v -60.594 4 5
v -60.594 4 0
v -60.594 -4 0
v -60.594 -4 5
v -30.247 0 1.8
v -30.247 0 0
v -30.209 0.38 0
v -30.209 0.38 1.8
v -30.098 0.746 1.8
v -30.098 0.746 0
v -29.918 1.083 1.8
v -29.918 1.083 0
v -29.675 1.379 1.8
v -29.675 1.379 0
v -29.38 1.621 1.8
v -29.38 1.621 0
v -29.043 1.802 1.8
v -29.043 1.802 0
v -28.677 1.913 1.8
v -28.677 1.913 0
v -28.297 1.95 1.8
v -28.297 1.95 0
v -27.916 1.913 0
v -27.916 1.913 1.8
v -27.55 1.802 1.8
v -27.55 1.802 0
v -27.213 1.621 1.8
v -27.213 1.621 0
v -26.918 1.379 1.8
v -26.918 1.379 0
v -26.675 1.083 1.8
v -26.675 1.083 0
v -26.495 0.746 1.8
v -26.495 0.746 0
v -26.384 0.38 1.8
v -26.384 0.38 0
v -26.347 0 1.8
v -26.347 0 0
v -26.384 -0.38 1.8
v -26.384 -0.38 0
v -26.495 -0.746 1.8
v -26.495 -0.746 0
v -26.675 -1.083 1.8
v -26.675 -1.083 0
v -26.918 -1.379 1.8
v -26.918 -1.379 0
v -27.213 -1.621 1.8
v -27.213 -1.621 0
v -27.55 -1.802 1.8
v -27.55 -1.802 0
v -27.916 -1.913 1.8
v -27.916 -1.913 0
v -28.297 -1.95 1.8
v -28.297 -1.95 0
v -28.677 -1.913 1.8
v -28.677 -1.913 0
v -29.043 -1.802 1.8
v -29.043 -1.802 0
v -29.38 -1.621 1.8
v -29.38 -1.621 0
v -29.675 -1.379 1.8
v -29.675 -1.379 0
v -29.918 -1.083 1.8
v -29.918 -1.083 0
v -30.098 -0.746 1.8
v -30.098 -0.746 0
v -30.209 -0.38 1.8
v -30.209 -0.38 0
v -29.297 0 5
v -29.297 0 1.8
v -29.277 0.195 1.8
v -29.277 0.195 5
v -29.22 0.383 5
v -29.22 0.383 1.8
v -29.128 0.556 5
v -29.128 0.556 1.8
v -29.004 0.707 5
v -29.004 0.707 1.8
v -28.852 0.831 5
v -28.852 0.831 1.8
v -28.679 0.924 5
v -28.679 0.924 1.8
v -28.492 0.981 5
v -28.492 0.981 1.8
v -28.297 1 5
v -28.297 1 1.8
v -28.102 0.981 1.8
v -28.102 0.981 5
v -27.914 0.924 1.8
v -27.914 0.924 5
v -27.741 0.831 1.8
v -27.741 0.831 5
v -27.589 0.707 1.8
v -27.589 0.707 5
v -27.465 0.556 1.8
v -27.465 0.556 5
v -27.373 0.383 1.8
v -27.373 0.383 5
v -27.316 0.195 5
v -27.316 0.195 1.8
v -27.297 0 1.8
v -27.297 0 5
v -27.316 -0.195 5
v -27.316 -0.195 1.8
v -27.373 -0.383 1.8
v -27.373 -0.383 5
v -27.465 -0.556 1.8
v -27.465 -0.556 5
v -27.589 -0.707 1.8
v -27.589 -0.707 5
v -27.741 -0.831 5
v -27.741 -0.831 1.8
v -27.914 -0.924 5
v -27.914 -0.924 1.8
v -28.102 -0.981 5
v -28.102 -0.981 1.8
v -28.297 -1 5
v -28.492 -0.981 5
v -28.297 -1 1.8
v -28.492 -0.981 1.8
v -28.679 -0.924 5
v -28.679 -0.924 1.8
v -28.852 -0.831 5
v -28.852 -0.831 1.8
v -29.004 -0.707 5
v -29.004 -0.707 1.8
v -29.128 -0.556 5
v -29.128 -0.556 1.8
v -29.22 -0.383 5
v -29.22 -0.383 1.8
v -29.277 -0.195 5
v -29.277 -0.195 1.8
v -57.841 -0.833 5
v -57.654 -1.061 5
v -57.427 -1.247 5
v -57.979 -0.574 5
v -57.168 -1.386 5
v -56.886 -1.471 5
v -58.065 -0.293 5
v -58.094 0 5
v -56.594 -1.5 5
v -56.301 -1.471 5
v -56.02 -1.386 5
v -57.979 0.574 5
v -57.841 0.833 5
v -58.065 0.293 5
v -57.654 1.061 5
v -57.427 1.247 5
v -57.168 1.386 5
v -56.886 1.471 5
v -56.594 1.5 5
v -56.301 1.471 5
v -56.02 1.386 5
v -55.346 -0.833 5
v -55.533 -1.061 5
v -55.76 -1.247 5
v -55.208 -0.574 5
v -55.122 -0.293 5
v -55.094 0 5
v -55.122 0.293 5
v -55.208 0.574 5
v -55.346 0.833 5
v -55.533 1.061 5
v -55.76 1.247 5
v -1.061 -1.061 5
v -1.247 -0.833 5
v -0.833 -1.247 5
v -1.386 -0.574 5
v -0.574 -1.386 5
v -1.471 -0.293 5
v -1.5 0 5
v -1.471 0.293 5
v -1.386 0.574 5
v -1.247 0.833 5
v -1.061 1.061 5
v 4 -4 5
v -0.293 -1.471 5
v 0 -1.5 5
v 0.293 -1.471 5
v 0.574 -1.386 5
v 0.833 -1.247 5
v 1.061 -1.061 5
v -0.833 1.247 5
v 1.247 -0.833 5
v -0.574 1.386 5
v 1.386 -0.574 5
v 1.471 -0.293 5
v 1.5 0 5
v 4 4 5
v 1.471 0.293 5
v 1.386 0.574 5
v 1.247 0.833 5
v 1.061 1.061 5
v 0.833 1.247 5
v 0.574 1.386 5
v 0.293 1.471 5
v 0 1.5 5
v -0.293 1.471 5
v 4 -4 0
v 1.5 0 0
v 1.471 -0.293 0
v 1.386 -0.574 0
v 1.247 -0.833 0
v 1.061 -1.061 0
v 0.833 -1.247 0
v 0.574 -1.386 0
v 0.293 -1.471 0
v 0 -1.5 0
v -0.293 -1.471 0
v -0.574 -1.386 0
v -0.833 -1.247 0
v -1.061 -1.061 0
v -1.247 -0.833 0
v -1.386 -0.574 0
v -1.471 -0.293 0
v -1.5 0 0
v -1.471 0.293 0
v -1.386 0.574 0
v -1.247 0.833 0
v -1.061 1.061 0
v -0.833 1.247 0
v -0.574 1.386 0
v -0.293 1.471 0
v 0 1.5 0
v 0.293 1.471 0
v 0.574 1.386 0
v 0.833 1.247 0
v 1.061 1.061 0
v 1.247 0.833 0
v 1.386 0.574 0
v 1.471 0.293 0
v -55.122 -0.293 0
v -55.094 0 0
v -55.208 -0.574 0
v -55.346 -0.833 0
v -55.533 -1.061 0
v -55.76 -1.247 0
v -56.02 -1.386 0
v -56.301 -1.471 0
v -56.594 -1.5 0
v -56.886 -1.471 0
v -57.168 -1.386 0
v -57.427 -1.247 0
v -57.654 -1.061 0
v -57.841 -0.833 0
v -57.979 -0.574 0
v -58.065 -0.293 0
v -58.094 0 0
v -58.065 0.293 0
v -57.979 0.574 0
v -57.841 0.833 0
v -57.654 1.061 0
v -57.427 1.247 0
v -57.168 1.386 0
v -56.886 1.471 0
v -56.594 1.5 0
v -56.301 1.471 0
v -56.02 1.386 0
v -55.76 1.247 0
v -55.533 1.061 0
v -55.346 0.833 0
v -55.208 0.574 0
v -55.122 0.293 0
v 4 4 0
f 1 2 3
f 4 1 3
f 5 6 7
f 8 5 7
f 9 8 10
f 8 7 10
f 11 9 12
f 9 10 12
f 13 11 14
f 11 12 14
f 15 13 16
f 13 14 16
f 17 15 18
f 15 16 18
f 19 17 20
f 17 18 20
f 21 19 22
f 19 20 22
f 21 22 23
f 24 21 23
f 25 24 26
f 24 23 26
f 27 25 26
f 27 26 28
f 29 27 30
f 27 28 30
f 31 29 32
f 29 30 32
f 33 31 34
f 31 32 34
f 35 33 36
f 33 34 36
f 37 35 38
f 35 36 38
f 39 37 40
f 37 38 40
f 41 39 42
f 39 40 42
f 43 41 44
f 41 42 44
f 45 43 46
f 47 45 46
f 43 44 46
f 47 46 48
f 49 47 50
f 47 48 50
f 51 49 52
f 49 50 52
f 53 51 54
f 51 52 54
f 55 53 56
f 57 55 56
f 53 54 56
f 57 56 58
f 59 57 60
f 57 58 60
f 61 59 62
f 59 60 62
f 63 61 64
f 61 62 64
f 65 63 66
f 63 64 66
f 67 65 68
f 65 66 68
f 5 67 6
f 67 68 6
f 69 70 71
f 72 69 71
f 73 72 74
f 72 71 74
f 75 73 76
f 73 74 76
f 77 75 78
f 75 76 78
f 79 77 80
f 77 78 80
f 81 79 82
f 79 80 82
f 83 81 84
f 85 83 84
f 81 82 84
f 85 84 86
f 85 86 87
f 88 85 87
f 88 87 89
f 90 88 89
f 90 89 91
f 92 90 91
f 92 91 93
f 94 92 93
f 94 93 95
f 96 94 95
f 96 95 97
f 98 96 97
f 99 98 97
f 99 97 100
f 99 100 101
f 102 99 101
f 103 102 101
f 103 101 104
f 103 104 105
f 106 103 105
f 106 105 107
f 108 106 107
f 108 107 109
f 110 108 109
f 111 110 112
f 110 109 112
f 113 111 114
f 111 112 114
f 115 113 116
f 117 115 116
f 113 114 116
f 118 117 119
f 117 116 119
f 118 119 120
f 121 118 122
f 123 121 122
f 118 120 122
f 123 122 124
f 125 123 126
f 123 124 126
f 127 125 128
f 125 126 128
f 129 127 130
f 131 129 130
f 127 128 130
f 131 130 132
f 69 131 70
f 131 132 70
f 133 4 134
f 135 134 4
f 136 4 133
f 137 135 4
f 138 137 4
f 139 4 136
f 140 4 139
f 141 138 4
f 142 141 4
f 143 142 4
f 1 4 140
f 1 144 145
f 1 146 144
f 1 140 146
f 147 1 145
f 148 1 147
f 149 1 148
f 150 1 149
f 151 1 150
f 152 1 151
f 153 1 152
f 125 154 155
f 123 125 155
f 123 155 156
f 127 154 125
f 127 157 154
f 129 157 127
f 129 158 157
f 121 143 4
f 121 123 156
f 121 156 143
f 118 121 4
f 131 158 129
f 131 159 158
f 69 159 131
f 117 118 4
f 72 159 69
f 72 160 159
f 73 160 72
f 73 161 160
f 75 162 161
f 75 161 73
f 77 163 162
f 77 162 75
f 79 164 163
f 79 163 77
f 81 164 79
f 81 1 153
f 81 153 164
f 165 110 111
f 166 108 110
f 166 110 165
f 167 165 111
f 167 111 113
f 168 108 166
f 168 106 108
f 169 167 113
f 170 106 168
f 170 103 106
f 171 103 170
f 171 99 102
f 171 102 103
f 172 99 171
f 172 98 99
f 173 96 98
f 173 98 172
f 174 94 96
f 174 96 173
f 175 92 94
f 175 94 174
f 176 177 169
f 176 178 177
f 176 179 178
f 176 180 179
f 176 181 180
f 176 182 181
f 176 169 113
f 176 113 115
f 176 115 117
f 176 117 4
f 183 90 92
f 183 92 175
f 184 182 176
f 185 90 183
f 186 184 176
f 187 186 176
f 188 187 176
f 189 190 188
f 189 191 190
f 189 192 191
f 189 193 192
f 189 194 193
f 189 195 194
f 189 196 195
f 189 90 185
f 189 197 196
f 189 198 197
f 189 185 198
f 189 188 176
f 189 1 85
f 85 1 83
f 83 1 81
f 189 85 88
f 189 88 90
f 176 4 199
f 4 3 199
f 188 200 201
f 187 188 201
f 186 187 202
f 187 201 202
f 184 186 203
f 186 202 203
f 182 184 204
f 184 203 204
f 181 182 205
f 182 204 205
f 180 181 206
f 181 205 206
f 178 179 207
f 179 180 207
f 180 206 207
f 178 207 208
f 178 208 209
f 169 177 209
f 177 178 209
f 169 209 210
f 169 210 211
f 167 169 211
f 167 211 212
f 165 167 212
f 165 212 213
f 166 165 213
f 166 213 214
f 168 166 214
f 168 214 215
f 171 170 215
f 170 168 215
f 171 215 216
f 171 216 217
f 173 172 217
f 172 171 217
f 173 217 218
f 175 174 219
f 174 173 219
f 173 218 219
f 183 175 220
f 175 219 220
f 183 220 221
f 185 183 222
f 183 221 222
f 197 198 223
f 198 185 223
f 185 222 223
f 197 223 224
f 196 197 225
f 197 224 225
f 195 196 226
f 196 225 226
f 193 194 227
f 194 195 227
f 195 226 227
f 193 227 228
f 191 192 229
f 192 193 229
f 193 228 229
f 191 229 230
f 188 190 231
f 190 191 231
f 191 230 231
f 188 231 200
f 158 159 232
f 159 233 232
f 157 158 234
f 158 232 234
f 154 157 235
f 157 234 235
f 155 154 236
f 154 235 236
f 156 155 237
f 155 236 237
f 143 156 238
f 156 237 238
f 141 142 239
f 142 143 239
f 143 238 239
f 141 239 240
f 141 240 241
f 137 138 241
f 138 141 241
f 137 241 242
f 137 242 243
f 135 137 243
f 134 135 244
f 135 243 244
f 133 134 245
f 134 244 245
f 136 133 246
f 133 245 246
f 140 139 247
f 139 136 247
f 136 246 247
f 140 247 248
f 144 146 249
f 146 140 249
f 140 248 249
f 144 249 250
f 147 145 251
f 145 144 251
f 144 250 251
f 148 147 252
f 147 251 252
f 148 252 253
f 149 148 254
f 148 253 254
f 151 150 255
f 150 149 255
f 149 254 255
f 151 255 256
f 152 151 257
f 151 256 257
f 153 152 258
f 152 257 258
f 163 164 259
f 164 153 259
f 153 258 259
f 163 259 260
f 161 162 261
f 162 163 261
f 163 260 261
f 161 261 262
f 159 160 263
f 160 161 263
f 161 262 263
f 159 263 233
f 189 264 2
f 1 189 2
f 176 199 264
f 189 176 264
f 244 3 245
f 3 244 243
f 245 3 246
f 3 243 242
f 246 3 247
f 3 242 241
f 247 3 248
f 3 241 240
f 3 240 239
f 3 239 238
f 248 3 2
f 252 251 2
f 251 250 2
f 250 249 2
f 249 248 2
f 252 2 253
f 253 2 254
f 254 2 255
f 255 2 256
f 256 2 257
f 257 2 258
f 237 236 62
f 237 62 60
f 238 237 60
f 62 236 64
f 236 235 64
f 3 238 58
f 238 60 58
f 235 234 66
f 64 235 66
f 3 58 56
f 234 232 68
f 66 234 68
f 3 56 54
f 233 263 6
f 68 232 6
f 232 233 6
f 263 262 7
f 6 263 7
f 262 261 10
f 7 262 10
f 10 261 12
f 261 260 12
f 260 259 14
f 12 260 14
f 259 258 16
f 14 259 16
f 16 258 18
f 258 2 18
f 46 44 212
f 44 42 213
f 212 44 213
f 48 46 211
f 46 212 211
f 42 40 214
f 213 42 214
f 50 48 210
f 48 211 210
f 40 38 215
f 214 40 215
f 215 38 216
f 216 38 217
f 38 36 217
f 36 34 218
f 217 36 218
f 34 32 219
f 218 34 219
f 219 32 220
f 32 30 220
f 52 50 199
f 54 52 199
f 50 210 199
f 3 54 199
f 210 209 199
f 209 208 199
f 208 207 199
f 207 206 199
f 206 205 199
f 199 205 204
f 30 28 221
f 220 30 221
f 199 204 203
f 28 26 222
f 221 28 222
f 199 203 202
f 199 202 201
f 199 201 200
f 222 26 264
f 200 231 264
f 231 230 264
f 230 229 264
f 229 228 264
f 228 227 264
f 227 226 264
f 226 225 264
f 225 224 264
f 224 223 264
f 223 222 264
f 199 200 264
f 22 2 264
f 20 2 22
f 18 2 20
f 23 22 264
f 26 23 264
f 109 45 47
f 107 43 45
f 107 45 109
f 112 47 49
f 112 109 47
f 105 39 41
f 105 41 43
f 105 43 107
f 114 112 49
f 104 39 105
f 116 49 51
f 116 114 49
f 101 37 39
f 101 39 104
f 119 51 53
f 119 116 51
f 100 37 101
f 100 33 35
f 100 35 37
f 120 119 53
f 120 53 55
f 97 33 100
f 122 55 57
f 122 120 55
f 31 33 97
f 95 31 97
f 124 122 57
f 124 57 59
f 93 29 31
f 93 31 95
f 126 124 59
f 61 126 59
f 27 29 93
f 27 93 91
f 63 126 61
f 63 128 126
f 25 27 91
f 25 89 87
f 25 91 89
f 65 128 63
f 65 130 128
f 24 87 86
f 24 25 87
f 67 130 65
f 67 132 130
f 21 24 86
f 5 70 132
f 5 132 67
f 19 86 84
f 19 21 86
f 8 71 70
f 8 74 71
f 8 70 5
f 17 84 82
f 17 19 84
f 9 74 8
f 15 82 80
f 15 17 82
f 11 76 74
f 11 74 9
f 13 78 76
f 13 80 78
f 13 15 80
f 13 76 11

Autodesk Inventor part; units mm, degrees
ref_plane "YZ Plane" through (0, 0, 0) normal (1, 0, 0) x (0, 1, 0)
ref_plane "XZ Plane" through (0, 0, 0) normal (0, 1, 0) x (-1, 0, 0)
ref_plane "XY Plane" through (0, 0, 0) normal (0, 0, 1) x (1, 0, 0)
sketch "Sketch1" plane through (0, 0, 0) normal (0, 0, 1) x (1, 0, 0)
  circle A0 centre (-56.5936, 0) radius 1.5 projected
  line L0 (-52.5936, 4) -> (-60.5936, 4) projected
  line L1 (-60.5936, 4) -> (-60.5936, -4) projected
  line L2 (-60.5936, -4) -> (-52.5936, -4) projected
  line L3 (-52.5936, -4) -> (-52.5936, 4) projected
  circle A1 centre (0, 0) radius 1.5 projected
  line L4 (-4, 4) -> (-4, -4) projected
  line L5 (-4, -4) -> (4, -4) projected
  line L6 (4, -4) -> (4, 4) projected
  line L7 (4, 4) -> (-4, 4) projected
  line L8 (-60.5936, 4) -> (4, 4)
  line L9 (4, 4) -> (4, -4)
  line L10 (4, -4) -> (-60.5936, -4)
  line L11 (-60.5936, -4) -> (-60.5936, 4)
  point P0 (0, 0)
extrude "Extrusion1" add sketch "Sketch1" along normal blind 5
sketch "Sketch2" plane through (0, 0, 0) normal (0, 0, -1) x (-1, 0, 0)
  point P0 (0, 0)
sketch "Sketch3" plane through (0, 0, 0) normal (0, 0, -1) x (-1, 0, 0)
  line L0 (60.5936, 4) -> (60.5936, -4) projected
  line L1 (-4, 4) -> (60.5936, 4) projected
  line L2 (-4, -4) -> (-4, 4) projected
  line L3 (60.5936, -4) -> (-4, -4) projected
  circle A0 centre (0, 0) radius 1.5 projected
  circle A1 centre (56.5936, 0) radius 1.5 projected
  circle A2 centre (28.2966, 0) radius 1.95
  point P0 (0, 0)
  point P1 (60.5936, 0)
  dimension "d2" = 3.9
  dimension "d4" = 32.297
extrude "Extrusion2" cut sketch "Sketch3" against normal blind 1.8 contours A2
sketch "Sketch4" plane through (-28.2966, 0, 1.8) normal (0, 0, -1) x (-1, 0, 0)
  circle A0 centre (0, 0) radius 1
  point P0 (-28.2966, 0)
  dimension "d7" = 2
extrude "Extrusion3" cut sketch "Sketch4" against normal through all
properties part number "vertical_axis_hal_holder"
